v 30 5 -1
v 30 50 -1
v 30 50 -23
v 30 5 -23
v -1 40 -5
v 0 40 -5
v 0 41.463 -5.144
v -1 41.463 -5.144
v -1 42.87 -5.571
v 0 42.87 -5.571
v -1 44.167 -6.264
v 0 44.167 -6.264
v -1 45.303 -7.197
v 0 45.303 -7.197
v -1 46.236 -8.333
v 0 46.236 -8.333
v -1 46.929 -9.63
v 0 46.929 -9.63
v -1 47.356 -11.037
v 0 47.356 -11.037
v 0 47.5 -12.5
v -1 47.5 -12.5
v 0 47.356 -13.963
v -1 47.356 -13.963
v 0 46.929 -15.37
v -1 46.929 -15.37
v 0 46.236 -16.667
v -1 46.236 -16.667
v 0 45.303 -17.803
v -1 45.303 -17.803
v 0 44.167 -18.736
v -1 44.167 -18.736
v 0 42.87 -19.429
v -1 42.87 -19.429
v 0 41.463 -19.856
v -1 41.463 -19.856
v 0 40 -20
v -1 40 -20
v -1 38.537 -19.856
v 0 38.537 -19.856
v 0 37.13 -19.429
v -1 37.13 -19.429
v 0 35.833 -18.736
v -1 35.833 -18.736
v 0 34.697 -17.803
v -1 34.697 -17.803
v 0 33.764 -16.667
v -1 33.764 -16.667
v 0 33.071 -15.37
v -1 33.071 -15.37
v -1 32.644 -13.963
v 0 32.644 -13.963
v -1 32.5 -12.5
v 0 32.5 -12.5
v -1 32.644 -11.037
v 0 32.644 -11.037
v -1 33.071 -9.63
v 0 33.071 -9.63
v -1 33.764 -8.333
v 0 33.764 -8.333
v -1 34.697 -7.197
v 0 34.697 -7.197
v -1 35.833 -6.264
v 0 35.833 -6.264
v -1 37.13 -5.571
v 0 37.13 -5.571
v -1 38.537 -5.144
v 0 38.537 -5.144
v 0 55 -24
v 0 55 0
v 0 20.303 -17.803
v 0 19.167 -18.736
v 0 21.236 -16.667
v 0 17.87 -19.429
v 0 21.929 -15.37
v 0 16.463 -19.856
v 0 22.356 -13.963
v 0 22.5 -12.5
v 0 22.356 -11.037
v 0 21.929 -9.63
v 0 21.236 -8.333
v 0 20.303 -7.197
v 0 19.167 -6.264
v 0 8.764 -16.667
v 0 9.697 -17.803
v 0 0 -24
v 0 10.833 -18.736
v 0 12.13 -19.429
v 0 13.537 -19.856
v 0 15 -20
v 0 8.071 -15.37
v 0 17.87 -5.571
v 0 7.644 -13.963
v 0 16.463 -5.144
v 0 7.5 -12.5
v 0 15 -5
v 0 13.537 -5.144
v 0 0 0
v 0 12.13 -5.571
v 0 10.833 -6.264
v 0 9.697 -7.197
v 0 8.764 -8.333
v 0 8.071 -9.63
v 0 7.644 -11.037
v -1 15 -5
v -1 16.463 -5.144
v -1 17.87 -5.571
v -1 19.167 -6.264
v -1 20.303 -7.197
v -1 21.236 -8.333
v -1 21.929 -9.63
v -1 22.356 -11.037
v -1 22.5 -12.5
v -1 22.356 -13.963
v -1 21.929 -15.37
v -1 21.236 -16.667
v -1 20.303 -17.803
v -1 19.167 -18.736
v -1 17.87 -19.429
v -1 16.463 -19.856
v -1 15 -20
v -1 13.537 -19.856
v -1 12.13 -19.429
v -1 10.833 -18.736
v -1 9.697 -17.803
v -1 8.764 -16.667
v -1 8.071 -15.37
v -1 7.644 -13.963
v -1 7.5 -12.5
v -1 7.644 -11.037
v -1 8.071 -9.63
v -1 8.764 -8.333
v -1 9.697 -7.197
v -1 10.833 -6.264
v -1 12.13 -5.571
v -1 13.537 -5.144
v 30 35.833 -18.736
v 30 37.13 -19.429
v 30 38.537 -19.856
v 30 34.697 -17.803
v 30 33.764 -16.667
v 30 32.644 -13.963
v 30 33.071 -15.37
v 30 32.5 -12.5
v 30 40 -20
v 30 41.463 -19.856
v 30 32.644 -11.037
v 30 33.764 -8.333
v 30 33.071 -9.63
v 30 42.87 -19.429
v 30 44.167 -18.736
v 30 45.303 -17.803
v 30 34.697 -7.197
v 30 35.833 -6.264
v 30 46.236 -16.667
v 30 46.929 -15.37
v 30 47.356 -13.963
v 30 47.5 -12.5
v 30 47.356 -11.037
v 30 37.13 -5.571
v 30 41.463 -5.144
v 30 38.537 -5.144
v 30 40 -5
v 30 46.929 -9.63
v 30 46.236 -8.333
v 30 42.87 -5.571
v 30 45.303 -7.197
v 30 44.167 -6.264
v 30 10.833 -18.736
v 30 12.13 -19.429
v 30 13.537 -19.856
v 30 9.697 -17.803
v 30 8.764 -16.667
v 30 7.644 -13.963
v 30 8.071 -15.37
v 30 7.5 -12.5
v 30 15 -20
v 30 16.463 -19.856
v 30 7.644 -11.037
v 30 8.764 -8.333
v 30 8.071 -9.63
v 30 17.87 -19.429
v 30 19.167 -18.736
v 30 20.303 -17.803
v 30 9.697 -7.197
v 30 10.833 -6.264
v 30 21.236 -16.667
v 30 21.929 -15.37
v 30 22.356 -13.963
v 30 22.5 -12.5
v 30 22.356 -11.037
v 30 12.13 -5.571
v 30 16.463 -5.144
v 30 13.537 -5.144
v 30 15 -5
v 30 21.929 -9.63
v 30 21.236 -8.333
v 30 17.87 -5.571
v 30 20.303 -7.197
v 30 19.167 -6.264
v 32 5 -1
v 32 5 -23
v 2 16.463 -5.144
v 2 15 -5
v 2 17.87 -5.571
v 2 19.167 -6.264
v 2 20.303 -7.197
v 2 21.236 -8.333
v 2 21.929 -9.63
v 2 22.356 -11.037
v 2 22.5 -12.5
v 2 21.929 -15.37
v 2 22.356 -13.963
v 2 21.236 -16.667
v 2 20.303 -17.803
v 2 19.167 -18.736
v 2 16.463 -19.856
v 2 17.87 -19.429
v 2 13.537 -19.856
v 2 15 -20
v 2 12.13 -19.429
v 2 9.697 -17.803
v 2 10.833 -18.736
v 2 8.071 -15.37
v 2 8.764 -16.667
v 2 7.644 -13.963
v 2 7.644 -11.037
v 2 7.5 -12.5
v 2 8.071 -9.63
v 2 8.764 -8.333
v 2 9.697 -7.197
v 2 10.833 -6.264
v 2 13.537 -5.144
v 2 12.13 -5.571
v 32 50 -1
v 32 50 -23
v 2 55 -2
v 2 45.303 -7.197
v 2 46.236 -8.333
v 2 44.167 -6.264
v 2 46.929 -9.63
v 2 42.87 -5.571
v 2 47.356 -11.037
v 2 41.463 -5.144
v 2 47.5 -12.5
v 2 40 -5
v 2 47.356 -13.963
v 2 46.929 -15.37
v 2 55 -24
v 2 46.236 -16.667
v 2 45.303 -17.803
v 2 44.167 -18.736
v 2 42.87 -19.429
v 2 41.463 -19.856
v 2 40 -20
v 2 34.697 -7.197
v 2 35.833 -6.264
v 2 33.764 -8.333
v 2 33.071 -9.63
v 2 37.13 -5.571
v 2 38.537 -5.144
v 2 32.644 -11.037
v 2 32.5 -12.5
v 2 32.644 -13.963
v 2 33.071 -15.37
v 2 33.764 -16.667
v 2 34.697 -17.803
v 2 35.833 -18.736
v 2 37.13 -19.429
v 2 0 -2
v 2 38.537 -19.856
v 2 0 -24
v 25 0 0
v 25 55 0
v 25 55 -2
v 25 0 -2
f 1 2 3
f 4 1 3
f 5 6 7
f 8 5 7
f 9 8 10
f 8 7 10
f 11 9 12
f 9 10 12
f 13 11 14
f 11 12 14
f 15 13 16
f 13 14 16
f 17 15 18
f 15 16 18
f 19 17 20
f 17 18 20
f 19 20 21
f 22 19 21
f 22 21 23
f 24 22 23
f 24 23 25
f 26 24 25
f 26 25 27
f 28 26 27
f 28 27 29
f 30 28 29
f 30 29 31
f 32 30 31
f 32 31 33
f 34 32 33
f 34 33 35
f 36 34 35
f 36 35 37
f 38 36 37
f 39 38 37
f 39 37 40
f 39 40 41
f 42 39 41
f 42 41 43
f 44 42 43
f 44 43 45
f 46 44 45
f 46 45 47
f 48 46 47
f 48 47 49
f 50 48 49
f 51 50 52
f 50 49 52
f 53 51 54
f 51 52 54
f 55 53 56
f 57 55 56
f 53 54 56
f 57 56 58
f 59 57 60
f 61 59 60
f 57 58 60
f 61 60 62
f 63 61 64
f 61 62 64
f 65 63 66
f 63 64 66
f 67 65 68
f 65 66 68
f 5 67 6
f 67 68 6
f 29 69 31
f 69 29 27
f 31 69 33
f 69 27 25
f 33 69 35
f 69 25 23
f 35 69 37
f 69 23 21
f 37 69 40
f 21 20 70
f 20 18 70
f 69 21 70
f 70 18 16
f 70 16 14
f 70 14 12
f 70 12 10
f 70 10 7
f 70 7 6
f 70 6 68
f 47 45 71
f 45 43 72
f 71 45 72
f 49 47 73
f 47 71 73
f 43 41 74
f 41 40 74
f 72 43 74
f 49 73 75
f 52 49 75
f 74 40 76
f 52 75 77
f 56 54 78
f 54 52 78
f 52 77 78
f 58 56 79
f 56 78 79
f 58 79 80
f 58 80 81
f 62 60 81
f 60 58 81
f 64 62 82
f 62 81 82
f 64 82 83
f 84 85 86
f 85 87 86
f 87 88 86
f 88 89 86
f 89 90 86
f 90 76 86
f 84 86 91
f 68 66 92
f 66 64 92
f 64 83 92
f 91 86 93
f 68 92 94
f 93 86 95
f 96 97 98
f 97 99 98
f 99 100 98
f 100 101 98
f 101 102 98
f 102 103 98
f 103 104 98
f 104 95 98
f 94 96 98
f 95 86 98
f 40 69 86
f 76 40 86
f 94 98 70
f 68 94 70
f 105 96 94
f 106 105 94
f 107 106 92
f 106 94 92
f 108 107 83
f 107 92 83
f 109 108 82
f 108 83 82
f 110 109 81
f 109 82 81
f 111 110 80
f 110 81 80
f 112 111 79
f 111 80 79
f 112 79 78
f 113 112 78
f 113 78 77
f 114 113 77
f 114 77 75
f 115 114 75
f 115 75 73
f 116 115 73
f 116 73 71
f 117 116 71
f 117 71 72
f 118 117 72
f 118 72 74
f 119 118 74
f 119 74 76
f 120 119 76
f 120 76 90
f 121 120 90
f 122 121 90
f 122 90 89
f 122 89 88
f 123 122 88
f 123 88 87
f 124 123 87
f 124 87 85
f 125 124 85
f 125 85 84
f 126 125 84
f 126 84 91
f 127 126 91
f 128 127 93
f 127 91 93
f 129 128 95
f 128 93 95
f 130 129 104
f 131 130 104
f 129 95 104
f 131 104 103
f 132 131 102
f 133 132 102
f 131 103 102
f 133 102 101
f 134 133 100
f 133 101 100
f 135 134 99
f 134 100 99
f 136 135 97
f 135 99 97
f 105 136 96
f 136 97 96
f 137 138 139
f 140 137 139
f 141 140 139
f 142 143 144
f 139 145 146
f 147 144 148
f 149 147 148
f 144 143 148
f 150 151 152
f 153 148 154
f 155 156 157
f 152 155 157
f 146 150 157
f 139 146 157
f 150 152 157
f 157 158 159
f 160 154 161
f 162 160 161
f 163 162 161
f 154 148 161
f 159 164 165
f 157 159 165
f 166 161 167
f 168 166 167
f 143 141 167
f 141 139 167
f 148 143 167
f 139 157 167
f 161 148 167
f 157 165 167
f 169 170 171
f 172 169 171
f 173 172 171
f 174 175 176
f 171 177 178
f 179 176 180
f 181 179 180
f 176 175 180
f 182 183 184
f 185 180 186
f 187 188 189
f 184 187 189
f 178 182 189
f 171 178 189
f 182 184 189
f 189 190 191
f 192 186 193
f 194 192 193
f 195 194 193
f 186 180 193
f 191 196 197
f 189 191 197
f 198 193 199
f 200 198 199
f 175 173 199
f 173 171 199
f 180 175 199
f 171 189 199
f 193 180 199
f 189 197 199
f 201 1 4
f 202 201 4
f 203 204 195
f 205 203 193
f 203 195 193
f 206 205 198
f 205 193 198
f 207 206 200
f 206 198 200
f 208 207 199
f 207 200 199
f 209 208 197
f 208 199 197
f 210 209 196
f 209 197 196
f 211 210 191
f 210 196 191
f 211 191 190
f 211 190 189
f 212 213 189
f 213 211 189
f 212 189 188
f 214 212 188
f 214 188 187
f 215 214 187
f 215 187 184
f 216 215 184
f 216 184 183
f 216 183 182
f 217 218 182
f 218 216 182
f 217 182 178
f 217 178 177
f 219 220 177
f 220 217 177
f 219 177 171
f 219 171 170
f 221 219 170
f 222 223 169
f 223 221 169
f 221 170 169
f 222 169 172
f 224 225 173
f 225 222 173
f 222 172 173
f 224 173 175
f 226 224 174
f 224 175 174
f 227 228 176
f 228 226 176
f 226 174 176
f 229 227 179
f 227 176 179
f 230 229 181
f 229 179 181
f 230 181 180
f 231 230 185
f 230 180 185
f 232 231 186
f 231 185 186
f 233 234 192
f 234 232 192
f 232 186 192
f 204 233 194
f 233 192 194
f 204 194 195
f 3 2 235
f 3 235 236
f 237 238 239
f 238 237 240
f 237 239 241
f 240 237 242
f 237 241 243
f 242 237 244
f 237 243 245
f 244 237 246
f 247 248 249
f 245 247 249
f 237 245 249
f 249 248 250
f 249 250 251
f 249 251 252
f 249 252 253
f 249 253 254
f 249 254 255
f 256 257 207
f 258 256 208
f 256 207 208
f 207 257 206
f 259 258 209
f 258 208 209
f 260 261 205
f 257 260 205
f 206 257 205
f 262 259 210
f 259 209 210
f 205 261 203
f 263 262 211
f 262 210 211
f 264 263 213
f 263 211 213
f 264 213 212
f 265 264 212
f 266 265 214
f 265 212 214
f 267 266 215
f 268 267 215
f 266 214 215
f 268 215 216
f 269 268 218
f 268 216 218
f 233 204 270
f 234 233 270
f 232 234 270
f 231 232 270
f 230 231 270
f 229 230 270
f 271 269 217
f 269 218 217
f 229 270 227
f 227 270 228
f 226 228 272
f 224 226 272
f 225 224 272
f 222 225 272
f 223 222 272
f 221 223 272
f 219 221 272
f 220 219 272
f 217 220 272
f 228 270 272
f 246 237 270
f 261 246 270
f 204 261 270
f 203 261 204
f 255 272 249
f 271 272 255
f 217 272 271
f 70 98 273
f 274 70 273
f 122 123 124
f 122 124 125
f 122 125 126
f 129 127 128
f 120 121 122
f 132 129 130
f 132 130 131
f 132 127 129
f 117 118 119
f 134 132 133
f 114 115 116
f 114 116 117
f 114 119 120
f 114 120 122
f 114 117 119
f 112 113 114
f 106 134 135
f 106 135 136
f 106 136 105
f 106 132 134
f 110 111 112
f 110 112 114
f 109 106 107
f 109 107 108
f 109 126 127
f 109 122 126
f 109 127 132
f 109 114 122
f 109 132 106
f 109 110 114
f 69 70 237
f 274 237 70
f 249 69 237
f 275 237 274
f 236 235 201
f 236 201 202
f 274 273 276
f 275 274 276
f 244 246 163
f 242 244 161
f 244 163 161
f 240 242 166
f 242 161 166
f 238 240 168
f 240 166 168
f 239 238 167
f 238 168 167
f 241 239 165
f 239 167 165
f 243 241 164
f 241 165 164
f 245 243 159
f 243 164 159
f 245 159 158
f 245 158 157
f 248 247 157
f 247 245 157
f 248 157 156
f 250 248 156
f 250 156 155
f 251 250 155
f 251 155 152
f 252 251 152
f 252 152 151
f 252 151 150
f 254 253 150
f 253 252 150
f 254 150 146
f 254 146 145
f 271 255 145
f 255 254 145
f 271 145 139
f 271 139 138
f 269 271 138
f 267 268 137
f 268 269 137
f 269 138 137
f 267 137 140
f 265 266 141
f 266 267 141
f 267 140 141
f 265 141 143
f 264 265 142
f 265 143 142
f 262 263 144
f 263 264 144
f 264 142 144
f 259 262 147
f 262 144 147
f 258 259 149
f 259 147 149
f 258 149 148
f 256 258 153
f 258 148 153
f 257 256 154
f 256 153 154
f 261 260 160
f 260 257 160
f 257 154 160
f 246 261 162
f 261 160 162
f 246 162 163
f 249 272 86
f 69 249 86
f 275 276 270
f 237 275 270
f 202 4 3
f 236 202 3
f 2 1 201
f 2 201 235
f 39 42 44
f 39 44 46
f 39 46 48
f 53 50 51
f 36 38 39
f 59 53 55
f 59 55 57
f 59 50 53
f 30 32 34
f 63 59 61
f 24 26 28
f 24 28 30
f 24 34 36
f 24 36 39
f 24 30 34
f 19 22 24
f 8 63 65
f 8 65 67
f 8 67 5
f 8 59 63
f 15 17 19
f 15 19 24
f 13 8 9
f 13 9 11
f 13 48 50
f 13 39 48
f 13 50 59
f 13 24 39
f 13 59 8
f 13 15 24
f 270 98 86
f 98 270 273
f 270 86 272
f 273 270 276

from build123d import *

# Parameters (mm, degrees)
BOSS_EXTRUDE1_DEPTH      = 55
BOSS_EXTRUDE2_DEPTH      = 1
BOSS_EXTRUDE2_DEPTH_BACK = 30
SKETCH2_R                = 7.5
SKETCH4_W                = 22
SKETCH4_H                = 45
BOSS_EXTRUDE3_DEPTH      = 2


with BuildPart() as part:
    # Sketch1 → Boss-Extrude1 (new body)
    with BuildSketch(Plane(origin=(0, 0, 0), x_dir=(1, 0, 0), z_dir=(0, 1, 0))):
        Polygon((0, 0), (25, 0), (25, 2), (2, 2), (2, 24), (0, 24), align=None)
    extrude(amount=BOSS_EXTRUDE1_DEPTH)

    # Sketch2 → Boss-Extrude2 (add, two sides: drawn at the far end of the back side and taken through both)
    with BuildSketch(Plane.ZY.offset(-BOSS_EXTRUDE2_DEPTH_BACK)):
        with Locations((-12.5, 15)):
            Circle(SKETCH2_R)
        with Locations((-12.5, 40)):
            Circle(SKETCH2_R)
    extrude(amount=BOSS_EXTRUDE2_DEPTH + BOSS_EXTRUDE2_DEPTH_BACK)


with BuildPart() as body_2:
    # Sketch4 → Boss-Extrude3 (new body)
    with BuildSketch(Plane(origin=(30, 0, 0), x_dir=(0, 0, -1), z_dir=(1, 0, 0))):
        with Locations((12, 27.5)):
            Rectangle(SKETCH4_W, SKETCH4_H)
    extrude(amount=BOSS_EXTRUDE3_DEPTH)


solid = Compound([part.part, body_2.part])
